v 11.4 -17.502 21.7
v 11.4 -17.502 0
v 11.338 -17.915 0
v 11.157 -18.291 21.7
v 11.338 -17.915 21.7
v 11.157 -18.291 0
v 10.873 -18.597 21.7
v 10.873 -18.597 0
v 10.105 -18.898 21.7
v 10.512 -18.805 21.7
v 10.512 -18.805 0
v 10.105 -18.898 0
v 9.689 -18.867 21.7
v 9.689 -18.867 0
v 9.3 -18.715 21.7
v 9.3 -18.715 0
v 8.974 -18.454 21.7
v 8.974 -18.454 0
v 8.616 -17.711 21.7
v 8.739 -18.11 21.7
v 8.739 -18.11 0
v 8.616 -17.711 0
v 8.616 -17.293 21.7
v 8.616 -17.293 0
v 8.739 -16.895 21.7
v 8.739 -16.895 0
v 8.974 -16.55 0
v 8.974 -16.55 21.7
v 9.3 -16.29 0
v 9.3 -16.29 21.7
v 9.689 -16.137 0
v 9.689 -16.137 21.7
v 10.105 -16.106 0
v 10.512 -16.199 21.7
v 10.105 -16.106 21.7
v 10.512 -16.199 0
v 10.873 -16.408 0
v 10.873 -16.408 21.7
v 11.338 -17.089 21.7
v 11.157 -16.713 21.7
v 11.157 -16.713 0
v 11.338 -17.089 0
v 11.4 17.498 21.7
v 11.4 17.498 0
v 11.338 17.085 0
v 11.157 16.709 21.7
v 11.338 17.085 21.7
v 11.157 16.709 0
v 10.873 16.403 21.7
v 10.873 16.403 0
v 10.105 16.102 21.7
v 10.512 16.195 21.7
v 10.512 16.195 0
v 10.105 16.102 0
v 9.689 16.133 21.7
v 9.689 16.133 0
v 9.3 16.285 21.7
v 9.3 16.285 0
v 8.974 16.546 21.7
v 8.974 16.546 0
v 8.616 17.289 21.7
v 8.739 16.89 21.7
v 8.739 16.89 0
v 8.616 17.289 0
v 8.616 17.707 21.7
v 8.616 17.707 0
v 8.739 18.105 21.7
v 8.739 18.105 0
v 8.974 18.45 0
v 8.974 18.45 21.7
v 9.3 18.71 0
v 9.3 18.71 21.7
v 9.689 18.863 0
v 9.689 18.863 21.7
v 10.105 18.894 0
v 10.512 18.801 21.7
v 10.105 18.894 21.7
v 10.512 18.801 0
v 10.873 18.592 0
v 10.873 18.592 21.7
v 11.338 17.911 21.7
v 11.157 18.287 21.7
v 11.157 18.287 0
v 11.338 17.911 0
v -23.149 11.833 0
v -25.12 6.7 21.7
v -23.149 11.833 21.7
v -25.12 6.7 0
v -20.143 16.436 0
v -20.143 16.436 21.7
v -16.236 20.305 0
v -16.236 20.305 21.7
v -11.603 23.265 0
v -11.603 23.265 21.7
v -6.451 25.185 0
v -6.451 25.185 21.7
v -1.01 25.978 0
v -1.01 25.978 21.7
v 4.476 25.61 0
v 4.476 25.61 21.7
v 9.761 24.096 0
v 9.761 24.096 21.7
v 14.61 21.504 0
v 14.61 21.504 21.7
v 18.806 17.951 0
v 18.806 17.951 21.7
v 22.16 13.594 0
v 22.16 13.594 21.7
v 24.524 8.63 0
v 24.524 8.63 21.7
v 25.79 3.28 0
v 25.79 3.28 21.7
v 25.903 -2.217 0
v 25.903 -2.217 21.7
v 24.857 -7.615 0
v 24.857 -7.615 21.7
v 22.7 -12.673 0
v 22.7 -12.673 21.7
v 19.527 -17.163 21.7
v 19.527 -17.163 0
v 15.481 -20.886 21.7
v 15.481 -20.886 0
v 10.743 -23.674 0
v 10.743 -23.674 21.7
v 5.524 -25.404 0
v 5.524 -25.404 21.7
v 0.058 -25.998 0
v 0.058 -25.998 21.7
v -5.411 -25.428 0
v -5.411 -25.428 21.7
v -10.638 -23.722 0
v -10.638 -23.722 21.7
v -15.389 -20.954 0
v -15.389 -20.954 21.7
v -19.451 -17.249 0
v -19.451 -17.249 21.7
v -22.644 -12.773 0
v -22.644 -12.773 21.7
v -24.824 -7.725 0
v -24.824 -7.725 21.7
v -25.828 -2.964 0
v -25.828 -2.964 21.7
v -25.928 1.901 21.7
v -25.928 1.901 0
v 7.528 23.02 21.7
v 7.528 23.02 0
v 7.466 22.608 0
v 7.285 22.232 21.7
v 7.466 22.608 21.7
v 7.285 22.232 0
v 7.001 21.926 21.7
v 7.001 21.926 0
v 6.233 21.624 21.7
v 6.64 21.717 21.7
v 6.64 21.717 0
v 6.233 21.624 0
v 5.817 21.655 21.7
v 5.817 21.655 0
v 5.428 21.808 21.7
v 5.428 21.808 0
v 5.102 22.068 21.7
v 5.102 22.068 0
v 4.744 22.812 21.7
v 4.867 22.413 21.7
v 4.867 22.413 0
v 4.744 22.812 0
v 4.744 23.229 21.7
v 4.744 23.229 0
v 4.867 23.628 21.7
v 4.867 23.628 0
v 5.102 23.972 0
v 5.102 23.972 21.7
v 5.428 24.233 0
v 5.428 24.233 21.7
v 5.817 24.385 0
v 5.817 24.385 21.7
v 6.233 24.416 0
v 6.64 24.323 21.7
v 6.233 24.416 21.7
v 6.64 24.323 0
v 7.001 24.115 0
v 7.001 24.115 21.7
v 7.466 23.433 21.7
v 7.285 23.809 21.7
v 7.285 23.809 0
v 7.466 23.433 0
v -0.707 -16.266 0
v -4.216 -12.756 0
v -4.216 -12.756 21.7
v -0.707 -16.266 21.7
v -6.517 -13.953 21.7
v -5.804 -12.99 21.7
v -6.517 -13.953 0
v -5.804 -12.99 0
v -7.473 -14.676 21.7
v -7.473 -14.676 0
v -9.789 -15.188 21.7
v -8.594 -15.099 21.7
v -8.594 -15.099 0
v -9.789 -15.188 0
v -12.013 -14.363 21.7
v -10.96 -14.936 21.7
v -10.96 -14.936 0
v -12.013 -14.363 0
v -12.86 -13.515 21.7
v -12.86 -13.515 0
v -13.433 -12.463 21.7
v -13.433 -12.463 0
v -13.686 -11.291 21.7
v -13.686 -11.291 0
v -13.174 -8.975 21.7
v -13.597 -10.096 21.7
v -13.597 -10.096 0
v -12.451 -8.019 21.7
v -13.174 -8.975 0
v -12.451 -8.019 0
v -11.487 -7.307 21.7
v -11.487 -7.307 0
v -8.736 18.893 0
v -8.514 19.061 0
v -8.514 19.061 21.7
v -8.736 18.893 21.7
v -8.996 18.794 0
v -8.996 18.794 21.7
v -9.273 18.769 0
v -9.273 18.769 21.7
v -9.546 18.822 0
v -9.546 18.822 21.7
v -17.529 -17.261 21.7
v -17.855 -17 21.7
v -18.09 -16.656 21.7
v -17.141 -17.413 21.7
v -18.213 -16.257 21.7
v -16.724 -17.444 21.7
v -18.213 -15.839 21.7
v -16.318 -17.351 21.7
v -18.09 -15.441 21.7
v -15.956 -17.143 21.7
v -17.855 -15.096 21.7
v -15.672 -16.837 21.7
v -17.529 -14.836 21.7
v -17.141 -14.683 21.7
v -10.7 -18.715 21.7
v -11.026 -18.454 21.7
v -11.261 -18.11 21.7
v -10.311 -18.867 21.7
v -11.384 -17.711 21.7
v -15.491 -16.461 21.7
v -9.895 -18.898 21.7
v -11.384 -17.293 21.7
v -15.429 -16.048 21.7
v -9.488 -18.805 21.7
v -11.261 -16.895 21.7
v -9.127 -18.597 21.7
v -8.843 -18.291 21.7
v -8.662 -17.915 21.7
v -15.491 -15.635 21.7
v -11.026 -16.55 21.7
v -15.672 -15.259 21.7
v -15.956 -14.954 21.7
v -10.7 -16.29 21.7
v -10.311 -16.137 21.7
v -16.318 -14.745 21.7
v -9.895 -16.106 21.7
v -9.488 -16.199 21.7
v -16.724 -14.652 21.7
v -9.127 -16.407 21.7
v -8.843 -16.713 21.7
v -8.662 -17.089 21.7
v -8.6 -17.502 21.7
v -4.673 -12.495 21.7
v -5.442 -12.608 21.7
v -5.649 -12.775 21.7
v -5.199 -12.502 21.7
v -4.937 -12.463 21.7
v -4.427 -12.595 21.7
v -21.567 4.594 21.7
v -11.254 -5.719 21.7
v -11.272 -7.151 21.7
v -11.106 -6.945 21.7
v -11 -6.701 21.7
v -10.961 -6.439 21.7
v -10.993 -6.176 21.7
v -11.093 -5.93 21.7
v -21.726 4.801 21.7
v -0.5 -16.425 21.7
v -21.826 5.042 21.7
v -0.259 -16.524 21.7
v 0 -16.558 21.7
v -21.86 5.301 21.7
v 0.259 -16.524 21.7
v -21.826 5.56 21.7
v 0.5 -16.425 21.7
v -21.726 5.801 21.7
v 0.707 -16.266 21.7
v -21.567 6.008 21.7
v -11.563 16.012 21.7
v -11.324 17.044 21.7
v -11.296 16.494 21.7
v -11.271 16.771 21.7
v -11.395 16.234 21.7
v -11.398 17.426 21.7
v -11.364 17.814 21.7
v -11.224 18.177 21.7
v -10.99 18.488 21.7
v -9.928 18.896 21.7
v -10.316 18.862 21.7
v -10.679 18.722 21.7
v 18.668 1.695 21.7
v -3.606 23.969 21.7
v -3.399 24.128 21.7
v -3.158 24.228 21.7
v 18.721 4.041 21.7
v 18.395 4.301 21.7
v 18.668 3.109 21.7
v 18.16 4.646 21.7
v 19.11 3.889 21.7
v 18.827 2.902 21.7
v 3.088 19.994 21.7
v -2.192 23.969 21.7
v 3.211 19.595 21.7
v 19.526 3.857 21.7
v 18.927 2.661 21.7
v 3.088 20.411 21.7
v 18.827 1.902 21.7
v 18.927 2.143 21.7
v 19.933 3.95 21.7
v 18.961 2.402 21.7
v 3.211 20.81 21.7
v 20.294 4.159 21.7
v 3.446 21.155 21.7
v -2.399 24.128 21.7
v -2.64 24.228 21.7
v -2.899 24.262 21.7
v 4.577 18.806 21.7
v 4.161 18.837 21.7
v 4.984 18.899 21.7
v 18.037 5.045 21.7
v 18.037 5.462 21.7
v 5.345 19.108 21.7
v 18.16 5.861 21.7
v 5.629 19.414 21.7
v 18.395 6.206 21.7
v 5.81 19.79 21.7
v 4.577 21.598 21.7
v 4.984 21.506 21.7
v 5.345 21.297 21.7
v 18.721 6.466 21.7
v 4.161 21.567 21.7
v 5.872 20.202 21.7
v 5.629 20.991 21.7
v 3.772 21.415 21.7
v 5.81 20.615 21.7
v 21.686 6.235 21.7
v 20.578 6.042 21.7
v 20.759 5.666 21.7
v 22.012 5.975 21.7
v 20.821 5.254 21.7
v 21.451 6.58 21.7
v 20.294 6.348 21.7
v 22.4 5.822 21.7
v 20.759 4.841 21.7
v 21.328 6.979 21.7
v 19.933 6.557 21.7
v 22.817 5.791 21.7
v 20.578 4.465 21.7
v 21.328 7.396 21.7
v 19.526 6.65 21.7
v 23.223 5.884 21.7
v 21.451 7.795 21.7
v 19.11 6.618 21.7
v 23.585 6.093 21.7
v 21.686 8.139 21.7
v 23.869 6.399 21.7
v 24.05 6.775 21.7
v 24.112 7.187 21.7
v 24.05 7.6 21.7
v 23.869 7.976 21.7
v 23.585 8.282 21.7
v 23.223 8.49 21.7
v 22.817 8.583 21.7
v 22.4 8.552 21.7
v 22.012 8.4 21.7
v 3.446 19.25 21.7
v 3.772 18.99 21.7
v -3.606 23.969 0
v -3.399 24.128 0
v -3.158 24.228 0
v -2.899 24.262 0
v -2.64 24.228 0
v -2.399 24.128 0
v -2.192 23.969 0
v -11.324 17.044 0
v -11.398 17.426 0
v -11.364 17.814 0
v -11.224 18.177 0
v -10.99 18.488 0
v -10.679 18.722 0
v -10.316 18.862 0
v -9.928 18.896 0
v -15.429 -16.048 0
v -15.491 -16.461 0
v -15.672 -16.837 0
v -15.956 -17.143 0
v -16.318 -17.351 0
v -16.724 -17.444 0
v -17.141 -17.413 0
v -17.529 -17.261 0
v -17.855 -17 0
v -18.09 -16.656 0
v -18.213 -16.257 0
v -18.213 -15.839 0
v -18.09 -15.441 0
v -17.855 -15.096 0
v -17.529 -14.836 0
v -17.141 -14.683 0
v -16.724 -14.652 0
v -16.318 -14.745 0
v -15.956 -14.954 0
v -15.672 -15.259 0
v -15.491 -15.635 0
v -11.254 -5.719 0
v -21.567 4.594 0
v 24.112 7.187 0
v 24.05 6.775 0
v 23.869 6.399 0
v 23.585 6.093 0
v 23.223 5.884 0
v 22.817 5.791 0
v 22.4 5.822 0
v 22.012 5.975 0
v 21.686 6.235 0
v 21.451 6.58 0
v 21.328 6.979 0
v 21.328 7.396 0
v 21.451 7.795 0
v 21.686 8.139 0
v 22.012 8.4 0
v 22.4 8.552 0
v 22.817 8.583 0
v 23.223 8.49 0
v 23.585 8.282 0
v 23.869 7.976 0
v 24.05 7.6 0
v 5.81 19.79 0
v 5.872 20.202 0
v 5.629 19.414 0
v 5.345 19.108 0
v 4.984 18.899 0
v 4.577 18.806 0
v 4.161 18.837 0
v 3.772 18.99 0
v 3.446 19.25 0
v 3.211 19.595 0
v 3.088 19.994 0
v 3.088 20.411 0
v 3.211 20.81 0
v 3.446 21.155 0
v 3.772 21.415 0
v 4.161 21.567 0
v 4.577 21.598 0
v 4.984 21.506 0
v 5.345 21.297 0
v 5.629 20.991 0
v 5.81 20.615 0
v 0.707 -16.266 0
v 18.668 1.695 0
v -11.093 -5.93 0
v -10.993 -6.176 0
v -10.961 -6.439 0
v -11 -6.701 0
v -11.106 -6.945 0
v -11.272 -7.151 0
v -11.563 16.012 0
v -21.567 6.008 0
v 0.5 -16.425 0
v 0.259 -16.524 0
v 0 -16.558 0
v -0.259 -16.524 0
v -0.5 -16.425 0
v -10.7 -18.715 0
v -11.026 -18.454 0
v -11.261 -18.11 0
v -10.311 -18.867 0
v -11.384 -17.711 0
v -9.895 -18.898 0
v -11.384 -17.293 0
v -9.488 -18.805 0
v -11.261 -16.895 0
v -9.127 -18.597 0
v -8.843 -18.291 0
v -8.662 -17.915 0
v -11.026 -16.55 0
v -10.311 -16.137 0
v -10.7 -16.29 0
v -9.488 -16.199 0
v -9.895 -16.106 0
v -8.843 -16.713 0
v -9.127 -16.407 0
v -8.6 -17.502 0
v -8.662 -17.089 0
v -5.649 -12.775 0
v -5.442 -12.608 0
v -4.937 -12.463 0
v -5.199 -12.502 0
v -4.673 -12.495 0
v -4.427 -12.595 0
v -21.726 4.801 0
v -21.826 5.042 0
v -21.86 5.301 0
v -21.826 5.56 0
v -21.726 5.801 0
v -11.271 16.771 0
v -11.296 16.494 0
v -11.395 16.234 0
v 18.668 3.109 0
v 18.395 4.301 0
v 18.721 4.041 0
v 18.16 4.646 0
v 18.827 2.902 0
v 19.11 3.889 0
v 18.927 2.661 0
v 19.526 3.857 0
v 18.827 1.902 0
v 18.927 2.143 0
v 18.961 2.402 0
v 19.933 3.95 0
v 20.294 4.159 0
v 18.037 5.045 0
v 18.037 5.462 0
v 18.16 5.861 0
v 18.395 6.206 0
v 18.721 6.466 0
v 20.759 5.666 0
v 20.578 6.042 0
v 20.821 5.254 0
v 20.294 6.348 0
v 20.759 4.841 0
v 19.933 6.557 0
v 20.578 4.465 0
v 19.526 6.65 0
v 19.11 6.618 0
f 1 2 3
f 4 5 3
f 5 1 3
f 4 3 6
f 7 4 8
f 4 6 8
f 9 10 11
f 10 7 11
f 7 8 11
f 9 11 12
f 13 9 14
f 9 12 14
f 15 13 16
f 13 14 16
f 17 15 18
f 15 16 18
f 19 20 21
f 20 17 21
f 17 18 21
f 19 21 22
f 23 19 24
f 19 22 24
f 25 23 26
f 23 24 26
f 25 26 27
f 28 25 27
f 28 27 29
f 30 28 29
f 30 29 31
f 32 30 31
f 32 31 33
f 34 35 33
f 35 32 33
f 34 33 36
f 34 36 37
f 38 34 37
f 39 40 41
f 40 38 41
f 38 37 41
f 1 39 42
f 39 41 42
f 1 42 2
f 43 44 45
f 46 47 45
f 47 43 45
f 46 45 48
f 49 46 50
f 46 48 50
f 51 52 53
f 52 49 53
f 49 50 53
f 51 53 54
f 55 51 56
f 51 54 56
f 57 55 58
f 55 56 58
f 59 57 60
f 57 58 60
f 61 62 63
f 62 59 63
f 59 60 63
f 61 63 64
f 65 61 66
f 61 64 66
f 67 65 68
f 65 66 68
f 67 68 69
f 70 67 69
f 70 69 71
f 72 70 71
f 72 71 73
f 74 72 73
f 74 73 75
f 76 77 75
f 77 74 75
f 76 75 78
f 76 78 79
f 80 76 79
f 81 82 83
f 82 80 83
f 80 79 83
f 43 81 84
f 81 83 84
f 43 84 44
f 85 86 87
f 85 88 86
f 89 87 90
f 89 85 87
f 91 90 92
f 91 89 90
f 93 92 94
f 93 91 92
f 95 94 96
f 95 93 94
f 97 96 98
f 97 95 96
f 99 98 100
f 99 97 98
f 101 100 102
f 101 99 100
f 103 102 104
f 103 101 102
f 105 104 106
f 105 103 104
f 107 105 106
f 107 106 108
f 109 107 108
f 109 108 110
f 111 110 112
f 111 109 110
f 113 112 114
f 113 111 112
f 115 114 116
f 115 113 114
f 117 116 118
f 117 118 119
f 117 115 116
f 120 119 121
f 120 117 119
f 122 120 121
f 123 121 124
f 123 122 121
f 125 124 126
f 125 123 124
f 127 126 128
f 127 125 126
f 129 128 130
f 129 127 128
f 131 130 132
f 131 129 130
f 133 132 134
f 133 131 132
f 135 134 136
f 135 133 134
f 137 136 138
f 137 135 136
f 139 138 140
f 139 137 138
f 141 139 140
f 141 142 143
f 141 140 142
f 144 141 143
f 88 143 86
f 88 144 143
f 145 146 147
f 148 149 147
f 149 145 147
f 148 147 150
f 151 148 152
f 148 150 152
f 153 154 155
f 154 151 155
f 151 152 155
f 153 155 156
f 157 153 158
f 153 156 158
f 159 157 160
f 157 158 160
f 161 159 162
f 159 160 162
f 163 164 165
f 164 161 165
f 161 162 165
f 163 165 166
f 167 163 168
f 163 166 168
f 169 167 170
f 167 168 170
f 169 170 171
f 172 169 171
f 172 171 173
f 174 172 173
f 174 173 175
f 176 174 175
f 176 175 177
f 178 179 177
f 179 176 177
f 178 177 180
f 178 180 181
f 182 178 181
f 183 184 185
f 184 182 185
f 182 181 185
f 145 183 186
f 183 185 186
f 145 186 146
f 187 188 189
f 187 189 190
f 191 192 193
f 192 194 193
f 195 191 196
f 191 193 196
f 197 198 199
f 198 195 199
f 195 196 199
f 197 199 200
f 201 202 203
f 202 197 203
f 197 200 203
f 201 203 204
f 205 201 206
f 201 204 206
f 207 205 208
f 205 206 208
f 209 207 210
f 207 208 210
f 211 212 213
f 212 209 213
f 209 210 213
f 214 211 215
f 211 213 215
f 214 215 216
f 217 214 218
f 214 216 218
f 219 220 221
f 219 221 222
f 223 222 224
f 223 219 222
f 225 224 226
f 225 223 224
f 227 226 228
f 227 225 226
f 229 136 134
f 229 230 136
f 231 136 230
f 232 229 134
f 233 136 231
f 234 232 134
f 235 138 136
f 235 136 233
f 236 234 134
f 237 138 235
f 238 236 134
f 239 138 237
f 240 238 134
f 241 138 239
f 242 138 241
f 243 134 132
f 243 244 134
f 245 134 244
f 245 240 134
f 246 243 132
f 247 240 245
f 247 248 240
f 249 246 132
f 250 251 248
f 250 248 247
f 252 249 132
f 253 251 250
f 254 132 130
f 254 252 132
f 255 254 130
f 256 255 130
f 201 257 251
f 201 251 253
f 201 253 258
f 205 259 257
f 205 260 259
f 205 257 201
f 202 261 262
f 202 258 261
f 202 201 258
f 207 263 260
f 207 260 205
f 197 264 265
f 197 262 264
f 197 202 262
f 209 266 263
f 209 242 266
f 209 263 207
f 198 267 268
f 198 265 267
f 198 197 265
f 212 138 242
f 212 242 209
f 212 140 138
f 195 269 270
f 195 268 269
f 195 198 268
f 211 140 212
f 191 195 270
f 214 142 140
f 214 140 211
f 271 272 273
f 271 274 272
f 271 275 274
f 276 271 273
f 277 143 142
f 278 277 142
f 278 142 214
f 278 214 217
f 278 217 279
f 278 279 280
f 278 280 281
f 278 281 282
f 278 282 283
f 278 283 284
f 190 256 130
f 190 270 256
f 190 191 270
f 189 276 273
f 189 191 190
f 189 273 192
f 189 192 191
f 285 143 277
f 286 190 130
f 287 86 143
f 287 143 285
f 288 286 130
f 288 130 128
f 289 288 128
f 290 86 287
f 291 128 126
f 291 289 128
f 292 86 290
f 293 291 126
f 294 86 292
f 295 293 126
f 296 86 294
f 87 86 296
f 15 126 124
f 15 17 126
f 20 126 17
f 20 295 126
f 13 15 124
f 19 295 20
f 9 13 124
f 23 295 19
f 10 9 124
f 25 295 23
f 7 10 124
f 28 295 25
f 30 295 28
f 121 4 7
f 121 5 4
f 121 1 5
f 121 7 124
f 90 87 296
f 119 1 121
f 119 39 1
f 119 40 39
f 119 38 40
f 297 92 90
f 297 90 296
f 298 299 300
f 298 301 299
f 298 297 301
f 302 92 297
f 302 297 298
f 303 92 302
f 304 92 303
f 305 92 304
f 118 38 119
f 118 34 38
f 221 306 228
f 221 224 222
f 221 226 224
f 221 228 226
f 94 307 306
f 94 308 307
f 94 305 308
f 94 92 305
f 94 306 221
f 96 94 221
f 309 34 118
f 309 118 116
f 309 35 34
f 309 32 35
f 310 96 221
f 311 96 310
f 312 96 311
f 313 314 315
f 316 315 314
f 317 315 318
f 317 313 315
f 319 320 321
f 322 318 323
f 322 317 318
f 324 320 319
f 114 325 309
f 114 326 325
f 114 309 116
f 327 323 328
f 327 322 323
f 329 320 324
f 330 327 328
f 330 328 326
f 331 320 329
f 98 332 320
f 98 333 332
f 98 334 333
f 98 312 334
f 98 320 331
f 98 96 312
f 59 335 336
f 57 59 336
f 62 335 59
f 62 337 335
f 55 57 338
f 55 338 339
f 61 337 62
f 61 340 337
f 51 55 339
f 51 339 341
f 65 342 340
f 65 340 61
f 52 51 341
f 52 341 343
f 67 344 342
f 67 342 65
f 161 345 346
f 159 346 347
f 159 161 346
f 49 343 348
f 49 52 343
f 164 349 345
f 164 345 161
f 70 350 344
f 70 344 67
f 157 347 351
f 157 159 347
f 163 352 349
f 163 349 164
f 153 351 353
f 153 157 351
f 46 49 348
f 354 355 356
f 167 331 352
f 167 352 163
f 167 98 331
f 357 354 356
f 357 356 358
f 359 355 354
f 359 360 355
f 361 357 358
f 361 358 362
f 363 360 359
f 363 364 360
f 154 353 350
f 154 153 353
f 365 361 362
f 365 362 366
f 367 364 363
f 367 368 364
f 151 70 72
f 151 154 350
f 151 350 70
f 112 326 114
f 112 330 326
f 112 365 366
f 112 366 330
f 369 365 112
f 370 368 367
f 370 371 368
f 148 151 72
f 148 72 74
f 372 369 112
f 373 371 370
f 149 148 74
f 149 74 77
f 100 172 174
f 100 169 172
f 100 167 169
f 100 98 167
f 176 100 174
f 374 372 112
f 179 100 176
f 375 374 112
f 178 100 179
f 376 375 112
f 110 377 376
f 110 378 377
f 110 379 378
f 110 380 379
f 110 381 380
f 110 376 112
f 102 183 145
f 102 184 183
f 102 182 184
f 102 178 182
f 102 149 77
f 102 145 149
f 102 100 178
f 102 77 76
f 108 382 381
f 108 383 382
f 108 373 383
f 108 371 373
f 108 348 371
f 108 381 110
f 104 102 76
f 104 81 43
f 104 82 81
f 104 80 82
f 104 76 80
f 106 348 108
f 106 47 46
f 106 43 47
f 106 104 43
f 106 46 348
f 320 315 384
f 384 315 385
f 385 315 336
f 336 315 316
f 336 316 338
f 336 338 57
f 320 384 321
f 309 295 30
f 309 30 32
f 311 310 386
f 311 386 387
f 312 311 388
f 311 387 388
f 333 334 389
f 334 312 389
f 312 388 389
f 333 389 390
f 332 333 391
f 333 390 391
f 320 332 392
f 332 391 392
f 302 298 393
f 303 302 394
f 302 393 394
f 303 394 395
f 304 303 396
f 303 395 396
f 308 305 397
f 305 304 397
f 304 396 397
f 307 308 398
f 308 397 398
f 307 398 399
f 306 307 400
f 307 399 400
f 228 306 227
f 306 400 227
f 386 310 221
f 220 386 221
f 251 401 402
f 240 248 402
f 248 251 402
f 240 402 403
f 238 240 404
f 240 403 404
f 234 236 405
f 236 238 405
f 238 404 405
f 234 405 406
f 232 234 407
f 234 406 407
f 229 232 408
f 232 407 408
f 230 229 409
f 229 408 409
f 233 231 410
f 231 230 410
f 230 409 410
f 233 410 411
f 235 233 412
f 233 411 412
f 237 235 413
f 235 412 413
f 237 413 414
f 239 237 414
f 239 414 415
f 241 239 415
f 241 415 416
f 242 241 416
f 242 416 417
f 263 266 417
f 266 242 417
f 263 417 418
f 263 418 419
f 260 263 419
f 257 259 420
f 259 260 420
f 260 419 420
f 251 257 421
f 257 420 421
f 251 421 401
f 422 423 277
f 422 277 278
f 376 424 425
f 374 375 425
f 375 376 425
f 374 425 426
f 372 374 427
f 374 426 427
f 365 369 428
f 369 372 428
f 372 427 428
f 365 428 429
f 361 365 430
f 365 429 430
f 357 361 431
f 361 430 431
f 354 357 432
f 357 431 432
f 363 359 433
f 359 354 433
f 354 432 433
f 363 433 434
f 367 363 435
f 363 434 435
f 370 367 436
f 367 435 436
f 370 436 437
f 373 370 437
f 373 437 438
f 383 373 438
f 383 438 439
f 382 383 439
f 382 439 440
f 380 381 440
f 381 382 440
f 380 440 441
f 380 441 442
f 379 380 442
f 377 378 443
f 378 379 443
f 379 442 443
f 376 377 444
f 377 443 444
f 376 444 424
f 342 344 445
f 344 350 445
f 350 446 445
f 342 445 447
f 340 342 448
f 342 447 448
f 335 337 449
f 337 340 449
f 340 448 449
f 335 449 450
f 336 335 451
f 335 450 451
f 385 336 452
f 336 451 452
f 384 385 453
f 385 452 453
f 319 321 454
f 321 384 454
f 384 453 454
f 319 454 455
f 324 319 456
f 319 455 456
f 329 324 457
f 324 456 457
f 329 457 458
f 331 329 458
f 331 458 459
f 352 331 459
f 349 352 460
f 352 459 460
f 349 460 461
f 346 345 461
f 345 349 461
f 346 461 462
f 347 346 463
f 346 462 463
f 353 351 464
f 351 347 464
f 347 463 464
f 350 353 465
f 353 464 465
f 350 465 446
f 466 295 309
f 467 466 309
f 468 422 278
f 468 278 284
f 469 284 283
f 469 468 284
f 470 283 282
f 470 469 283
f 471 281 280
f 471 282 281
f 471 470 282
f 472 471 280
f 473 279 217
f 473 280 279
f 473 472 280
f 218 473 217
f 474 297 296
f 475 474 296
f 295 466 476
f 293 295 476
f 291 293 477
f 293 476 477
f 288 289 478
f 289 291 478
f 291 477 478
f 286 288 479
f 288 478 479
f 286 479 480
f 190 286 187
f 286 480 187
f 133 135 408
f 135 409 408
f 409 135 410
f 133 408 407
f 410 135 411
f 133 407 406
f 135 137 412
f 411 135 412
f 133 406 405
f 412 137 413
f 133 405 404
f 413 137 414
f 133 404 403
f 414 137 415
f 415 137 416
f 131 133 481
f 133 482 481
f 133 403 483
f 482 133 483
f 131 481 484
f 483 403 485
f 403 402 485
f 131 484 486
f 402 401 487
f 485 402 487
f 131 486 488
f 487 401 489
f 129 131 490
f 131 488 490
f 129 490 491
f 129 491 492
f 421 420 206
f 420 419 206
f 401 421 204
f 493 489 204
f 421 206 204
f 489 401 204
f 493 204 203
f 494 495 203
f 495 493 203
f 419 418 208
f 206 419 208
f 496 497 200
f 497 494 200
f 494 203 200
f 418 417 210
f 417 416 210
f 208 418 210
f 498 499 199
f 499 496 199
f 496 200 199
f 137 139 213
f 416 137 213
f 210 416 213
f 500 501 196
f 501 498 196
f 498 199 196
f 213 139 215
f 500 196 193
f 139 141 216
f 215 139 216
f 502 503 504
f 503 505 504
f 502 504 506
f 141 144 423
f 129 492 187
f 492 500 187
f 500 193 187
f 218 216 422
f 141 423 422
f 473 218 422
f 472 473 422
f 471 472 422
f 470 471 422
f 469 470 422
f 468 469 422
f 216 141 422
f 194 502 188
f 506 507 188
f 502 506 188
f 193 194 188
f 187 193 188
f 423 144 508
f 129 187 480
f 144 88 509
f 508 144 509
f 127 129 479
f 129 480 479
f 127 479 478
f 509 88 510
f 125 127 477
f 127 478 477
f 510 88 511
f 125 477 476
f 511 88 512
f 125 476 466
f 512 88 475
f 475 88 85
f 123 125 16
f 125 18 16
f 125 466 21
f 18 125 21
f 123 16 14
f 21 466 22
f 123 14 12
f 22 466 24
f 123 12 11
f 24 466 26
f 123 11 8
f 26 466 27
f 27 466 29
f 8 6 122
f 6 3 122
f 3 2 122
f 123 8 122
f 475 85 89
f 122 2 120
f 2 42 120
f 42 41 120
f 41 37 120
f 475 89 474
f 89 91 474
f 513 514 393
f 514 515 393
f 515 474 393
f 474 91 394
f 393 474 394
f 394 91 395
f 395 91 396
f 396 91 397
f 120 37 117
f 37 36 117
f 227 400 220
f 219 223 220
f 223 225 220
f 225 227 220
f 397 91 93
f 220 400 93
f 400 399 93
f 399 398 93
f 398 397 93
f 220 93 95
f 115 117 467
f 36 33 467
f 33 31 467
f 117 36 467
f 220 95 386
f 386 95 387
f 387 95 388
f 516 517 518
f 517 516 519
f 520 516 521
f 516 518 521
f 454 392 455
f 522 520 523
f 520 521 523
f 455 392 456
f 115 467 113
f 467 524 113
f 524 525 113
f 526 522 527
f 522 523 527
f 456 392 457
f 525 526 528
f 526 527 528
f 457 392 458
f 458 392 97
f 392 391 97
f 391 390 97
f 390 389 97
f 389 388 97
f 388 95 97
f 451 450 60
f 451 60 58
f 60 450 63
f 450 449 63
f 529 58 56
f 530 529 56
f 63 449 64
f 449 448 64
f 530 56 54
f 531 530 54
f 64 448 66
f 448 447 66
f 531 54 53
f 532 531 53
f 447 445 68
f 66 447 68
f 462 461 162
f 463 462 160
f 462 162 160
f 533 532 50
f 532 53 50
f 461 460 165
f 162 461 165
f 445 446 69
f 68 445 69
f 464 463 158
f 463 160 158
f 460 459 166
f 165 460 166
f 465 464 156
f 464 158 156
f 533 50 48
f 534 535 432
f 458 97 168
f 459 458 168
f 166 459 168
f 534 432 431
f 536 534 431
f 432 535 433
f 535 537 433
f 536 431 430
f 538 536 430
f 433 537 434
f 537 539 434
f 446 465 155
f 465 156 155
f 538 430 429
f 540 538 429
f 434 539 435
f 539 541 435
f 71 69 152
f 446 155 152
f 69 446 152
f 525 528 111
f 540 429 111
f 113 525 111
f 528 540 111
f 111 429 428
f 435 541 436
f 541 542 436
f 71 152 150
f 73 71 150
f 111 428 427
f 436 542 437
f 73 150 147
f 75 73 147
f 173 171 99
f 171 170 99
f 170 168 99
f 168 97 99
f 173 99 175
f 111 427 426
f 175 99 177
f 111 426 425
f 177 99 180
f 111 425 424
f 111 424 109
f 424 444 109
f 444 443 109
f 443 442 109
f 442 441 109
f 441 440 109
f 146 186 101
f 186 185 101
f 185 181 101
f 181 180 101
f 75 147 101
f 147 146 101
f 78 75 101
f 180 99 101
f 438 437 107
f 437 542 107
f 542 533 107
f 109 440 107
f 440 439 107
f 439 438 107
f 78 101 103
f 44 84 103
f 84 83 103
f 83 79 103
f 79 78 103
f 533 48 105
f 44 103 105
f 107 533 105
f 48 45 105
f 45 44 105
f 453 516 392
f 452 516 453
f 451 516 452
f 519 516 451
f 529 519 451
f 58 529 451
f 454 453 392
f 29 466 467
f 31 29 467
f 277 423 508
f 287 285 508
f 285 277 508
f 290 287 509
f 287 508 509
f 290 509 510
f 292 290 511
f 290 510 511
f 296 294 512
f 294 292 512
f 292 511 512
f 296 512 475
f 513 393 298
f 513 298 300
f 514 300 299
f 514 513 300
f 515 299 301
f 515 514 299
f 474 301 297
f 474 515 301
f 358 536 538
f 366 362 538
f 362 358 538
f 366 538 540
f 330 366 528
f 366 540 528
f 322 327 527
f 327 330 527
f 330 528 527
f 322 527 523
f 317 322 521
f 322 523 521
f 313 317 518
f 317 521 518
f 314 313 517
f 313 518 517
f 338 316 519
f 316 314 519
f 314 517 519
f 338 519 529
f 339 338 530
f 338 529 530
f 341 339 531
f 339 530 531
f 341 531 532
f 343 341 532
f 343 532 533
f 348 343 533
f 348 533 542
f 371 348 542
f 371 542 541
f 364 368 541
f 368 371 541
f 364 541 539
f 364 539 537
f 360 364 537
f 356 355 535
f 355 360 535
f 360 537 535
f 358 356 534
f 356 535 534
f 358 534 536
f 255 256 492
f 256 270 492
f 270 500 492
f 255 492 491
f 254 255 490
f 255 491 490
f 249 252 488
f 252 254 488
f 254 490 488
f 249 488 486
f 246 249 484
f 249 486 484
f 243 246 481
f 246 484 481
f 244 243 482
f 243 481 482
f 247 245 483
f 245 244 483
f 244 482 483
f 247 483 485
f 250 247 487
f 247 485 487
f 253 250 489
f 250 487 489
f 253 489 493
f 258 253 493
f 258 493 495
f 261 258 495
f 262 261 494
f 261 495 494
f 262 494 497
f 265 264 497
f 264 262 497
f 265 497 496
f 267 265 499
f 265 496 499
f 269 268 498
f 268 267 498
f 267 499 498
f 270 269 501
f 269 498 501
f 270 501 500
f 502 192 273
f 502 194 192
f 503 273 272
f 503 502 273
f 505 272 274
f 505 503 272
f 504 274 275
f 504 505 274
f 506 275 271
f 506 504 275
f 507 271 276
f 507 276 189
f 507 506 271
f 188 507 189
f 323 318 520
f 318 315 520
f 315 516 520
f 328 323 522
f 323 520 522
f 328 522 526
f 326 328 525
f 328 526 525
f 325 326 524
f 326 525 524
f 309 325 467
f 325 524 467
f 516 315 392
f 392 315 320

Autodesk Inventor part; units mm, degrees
ref_plane "YZ Plane" through (0, 0, 0) normal (1, 0, 0) x (0, 1, 0)
ref_plane "XZ Plane" through (0, 0, 0) normal (0, 1, 0) x (-1, 0, 0)
ref_plane "Arbeitsebene1" through (0, 0, 0) normal (0, 0, 1) x (1, 0, 0)
sketch "Skizze1" plane through (0, 0, 0) normal (0, 0, 1) x (1, 0, 0)
  circle A0 centre (-9.9998, 17.4978) radius 1.3999 projected
  circle A1 centre (10.0001, 17.4979) radius 1.4 projected
  circle A2 centre (10.0001, -17.5021) radius 1.4 projected
  circle A3 centre (-9.9999, -17.5021) radius 1.4001 projected
  circle A4 centre (4.4725, 20.2023) radius 1.4 projected
  circle A5 centre (19.4212, 5.2535) radius 1.4 projected
  circle A6 centre (0.0001, -0.0022) radius 6.7754 projected
  arc A7 (-25.1198, 6.6998) -> (-24.1417, 5.4917) centre (-24.1417, 6.4917) ccw projected
  line L0 (-24.1417, 5.4917) -> (-17.7002, 5.4917) projected
  arc A8 (-15.7002, 3.4917) -> (-17.7002, 5.4917) centre (-17.7002, 3.4917) ccw projected
  line L1 (-15.7002, 3.4917) -> (-15.7002, -4.496) projected
  arc A9 (-17.7002, -6.496) -> (-15.7002, -4.496) centre (-17.7002, -4.496) ccw projected
  line L2 (-17.7002, -6.496) -> (-23.8502, -6.496) projected
  arc A10 (-23.8502, -6.496) -> (-24.8235, -7.7254) centre (-23.8502, -7.496) ccw projected
  arc A11 (-24.8235, -7.7254) -> (-25.1198, 6.6998) centre (0, 0) ccw projected
  circle A12 centre (-9.4998, -11.0022) radius 2.6601 projected
  circle A13 centre (-16.8291, -16.0481) radius 1.4 projected
  circle A14 centre (6.1284, 23.0202) radius 1.4 projected
  circle A15 centre (22.7119, 7.1872) radius 1.4 projected
  arc A16 (-25.1198, 6.6998) -> (-24.6232, -8.3421) centre (0, 0) ccw
  circle A17 centre (-9.4998, -11.0022) radius 4.196
  point P0 (0, 0)
ref_plane "Arbeitsebene2" through (-21.5666, -16.2656, 21.7) normal (0, 0, 1) x (0.7071, -0.7071, 0)
extrude "Extrusion1" add sketch "Skizze1" along normal up to surface (21.7 mm away) contours A11 A10 L2 A9 L1 A8 L0 A7 | A7 L0 A8 L1 A9 L2 A10 A16
sketch "Skizze2" plane through (-24.1417, 5.4917, 21.7) normal (0, 0, 1) x (1, 0, 0)
  arc A0 (30.5656, -11.7979) -> (31.153, -11.2105) centre (30.5058, -11.1507) ccw projected
  line L0 (30.5656, -11.7979) -> (24.8489, -17.5146) projected
  line L1 (24.8489, -17.5146) -> (19.6708, -12.3365) projected
  arc A1 (17.2991, -9.9648) -> (19.6708, -12.3365) centre (18.1314, -11.5042) ccw projected
  line L2 (17.2991, -9.9648) -> (12.8281, -5.4938) projected
  line L3 (12.8281, -5.4938) -> (15.7017, -2.6202) projected
  arc A2 (17.7327, -0.5892) -> (15.7017, -2.6202) centre (16.0101, -0.8976) ccw projected
  line L4 (17.7327, -0.5892) -> (24.1418, 5.8199) projected
  line L5 (24.1418, 5.8199) -> (28.7374, 1.2243) projected
  arc A3 (30.8599, -0.8982) -> (28.7374, 1.2243) centre (30.435, 0.7994) ccw projected
  line L6 (30.8599, -0.8982) -> (36.1626, -6.2009) projected
  line L7 (36.1626, -6.2009) -> (34.5533, -7.8102) projected
  arc A4 (32.1151, -10.2485) -> (34.5533, -7.8102) centre (33.5463, -9.2415) ccw projected
  line L8 (32.1151, -10.2485) -> (31.153, -11.2105) projected
  circle A5 centre (12.8281, -4.0796) radius 0.65 projected
  line L9 (21.2427, 4.9006) -> (17.8485, 8.2948) projected
  line L10 (17.8485, 8.2948) -> (14.4544, 11.6889) projected
  line L11 (14.4544, 11.6889) -> (2.575, -0.1905) projected
  line L12 (2.575, -0.1905) -> (24.1418, -21.7573) projected
  line L13 (24.1418, -21.7573) -> (42.8094, -3.0897) projected
  line L14 (42.8094, -3.0897) -> (28.0309, 11.6889) projected
  line L15 (28.0309, 11.6889) -> (24.6368, 8.2948) projected
  line L16 (24.6368, 8.2948) -> (21.2427, 4.9006) projected
  circle A6 centre (21.2427, 11.6889) radius 4.8 projected
  line L17 (42.8094, -3.0897) -> (24.1418, -21.7573)
  line L18 (24.1418, -21.7573) -> (2.575, -0.1905)
  line L19 (2.575, -0.1905) -> (21.2427, 18.4771)
  line L20 (21.2427, 18.4771) -> (42.8094, -3.0897)
  line L21 (21.2427, 19.1842) -> (1.8679, -0.1905)
  line L22 (1.8679, -0.1905) -> (24.1418, -22.4644)
  line L23 (24.1418, -22.4644) -> (43.5165, -3.0897)
  line L24 (43.5165, -3.0897) -> (21.2427, 19.1842)
  point P0 (24.1417, -5.4917)
  dimension "d2" = 0.5
extrude "Extrusion2" cut sketch "Skizze2" against normal through all contours L0 L1 A1 L2 L3 A2 L4 L5 A3 L6 L7 A4 L8 A0 | A5 | L16 L15 L14 L13 L12 L11 L10 L9 | L9 A6 L16 | A6 | L10 L19 A6 | A6 L20 L15 | L19 L20 A6 | L24 L23 L22 L21
fillet "Rundung1" radius 1 8 edges at (-2.899, 24.6759, 10.85) (19.3748, 2.402, 10.85) (0.0001, -16.9727, 10.85) (-22.2737, 5.3011, 10.85) (-10.1203, -6.8523, 10.85) (-5.3499, -11.6226, 10.85) (-11.0276, 16.5473, 10.85) (-9.0493, 18.5256, 10.85)
properties part number "Matchboxscope_focusingblock_v0"
